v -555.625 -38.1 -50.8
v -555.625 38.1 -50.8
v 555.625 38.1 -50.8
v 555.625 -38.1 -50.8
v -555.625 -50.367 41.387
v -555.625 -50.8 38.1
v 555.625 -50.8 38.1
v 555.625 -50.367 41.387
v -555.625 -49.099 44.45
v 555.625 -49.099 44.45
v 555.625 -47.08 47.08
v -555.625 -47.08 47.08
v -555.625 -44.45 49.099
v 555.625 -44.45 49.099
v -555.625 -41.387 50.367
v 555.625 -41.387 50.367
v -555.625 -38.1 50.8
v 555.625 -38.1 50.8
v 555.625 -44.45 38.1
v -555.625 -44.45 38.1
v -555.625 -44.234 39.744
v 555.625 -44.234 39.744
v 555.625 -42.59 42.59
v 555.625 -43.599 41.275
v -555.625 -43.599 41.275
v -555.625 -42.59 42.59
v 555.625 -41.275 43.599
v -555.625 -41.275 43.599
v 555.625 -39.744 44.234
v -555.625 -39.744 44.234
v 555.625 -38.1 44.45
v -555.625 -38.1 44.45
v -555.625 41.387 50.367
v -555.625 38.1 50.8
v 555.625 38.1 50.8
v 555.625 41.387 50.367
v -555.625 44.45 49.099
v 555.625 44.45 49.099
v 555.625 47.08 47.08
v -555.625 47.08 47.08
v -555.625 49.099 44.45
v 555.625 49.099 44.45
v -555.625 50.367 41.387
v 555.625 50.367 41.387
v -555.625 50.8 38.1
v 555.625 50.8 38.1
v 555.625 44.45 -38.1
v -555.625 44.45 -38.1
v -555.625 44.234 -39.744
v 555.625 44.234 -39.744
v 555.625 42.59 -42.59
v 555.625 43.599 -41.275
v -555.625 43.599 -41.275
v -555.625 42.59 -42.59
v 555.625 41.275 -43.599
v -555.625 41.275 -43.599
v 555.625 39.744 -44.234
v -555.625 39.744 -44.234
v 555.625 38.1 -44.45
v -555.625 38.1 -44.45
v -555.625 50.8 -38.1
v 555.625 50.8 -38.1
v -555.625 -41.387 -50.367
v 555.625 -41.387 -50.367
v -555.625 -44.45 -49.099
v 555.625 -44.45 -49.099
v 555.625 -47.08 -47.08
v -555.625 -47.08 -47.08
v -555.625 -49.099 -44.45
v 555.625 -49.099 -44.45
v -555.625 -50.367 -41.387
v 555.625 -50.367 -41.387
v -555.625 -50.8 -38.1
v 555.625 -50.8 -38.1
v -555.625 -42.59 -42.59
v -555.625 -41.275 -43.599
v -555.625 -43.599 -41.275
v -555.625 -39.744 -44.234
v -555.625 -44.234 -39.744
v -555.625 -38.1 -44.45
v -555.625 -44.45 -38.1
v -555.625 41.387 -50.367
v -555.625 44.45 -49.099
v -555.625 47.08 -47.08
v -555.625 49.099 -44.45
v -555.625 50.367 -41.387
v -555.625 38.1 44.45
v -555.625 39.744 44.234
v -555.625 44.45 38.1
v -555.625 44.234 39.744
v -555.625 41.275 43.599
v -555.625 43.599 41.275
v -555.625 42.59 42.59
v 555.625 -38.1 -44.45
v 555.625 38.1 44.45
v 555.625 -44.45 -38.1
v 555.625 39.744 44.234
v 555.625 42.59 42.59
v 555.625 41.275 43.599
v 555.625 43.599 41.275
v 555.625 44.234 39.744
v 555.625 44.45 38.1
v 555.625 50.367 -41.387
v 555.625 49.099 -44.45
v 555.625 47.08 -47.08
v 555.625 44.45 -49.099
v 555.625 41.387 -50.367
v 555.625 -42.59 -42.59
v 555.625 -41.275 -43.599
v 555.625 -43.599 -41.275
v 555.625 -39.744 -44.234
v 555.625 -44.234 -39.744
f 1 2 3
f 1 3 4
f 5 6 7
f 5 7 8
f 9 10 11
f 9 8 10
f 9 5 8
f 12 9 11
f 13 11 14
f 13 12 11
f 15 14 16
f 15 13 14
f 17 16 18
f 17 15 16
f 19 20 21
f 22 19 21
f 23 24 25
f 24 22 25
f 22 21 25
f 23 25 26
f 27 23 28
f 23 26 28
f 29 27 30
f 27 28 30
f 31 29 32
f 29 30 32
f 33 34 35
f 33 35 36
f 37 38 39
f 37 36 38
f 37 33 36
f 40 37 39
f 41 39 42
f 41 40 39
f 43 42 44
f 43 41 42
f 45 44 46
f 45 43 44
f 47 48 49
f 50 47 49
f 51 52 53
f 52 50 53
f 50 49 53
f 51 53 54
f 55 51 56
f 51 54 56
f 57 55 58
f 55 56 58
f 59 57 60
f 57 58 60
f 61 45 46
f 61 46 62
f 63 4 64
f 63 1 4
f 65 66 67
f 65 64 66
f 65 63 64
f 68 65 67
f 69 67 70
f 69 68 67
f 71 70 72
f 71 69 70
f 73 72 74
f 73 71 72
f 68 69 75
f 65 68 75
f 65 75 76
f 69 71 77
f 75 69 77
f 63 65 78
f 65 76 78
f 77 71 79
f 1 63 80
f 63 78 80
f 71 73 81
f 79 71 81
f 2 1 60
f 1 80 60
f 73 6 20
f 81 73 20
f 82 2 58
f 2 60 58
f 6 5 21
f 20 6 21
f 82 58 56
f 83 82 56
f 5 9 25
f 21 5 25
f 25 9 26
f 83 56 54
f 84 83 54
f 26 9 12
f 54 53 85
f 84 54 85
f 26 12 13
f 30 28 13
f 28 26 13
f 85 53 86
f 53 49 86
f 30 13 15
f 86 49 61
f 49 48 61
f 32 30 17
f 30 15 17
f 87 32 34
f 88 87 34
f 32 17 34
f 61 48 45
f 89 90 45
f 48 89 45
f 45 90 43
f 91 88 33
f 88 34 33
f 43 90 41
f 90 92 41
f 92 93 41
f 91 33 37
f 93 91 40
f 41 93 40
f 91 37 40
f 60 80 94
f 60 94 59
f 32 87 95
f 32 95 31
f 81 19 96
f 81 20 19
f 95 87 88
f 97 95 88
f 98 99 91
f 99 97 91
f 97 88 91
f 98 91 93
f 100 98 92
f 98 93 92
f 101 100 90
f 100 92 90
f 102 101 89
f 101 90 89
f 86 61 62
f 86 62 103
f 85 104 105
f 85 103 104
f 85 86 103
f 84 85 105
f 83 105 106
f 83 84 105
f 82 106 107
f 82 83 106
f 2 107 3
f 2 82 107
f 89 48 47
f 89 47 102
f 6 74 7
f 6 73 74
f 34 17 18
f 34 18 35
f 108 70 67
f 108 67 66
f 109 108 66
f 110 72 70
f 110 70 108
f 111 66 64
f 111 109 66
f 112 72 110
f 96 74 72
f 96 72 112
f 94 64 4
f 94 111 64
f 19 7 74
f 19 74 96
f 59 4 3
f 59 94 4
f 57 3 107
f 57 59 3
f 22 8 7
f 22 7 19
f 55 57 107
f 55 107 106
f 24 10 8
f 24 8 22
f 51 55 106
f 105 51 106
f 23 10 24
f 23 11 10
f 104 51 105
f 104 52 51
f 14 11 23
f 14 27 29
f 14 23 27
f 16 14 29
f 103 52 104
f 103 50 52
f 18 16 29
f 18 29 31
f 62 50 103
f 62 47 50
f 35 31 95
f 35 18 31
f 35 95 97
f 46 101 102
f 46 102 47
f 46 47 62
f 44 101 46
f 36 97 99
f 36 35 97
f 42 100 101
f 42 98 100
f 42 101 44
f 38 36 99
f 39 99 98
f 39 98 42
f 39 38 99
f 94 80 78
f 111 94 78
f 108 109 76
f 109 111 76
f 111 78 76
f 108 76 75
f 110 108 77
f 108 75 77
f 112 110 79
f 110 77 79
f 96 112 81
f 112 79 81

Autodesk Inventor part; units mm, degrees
ref_plane "YZ Plane" through (0, 0, 0) normal (1, 0, 0) x (0, 1, 0)
ref_plane "XZ Plane" through (0, 0, 0) normal (0, 1, 0) x (-1, 0, 0)
ref_plane "XY Plane" through (0, 0, 0) normal (0, 0, 1) x (1, 0, 0)
sketch "Sketch5" plane through (0, 0, 0) normal (1, 0, 0) x (0, 1, 0)
  line L0 (-38.1, 50.8) -> (38.1, 50.8)
  line L1 (50.8, 38.1) -> (50.8, -38.1)
  line L2 (38.1, -50.8) -> (-38.1, -50.8)
  line L3 (-50.8, -38.1) -> (-50.8, 38.1)
  line L4 (-50.8, 50.8) -> (50.8, -50.8) construction
  line L5 (50.8, 50.8) -> (-50.8, -50.8) construction
  arc A0 (50.8, 38.1) -> (38.1, 50.8) centre (38.1, 38.1) ccw
  arc A1 (38.1, -50.8) -> (50.8, -38.1) centre (38.1, -38.1) ccw
  arc A2 (-50.8, -38.1) -> (-38.1, -50.8) centre (-38.1, -38.1) ccw
  arc A3 (-38.1, 50.8) -> (-50.8, 38.1) centre (-38.1, 38.1) ccw
  line L6 (44.45, -38.1) -> (44.45, 38.1)
  arc A4 (44.45, 38.1) -> (38.1, 44.45) centre (38.1, 38.1) ccw
  line L7 (38.1, 44.45) -> (-38.1, 44.45)
  arc A5 (-38.1, 44.45) -> (-44.45, 38.1) centre (-38.1, 38.1) ccw
  line L8 (-44.45, 38.1) -> (-44.45, -38.1)
  arc A6 (-44.45, -38.1) -> (-38.1, -44.45) centre (-38.1, -38.1) ccw
  line L9 (-38.1, -44.45) -> (38.1, -44.45)
  arc A7 (38.1, -44.45) -> (44.45, -38.1) centre (38.1, -38.1) ccw
  point P0 (0, 0)
  dimension "d6" = 101.6
  dimension "d7" = 101.6
  dimension "d8" = 12.7
  dimension "d9" = 6.35
extrude "Extrusion4" add sketch "Sketch5" along normal mid plane 1111.25
properties part number "Front Hitch Model-2_Base Tube-1" material "SS304"
